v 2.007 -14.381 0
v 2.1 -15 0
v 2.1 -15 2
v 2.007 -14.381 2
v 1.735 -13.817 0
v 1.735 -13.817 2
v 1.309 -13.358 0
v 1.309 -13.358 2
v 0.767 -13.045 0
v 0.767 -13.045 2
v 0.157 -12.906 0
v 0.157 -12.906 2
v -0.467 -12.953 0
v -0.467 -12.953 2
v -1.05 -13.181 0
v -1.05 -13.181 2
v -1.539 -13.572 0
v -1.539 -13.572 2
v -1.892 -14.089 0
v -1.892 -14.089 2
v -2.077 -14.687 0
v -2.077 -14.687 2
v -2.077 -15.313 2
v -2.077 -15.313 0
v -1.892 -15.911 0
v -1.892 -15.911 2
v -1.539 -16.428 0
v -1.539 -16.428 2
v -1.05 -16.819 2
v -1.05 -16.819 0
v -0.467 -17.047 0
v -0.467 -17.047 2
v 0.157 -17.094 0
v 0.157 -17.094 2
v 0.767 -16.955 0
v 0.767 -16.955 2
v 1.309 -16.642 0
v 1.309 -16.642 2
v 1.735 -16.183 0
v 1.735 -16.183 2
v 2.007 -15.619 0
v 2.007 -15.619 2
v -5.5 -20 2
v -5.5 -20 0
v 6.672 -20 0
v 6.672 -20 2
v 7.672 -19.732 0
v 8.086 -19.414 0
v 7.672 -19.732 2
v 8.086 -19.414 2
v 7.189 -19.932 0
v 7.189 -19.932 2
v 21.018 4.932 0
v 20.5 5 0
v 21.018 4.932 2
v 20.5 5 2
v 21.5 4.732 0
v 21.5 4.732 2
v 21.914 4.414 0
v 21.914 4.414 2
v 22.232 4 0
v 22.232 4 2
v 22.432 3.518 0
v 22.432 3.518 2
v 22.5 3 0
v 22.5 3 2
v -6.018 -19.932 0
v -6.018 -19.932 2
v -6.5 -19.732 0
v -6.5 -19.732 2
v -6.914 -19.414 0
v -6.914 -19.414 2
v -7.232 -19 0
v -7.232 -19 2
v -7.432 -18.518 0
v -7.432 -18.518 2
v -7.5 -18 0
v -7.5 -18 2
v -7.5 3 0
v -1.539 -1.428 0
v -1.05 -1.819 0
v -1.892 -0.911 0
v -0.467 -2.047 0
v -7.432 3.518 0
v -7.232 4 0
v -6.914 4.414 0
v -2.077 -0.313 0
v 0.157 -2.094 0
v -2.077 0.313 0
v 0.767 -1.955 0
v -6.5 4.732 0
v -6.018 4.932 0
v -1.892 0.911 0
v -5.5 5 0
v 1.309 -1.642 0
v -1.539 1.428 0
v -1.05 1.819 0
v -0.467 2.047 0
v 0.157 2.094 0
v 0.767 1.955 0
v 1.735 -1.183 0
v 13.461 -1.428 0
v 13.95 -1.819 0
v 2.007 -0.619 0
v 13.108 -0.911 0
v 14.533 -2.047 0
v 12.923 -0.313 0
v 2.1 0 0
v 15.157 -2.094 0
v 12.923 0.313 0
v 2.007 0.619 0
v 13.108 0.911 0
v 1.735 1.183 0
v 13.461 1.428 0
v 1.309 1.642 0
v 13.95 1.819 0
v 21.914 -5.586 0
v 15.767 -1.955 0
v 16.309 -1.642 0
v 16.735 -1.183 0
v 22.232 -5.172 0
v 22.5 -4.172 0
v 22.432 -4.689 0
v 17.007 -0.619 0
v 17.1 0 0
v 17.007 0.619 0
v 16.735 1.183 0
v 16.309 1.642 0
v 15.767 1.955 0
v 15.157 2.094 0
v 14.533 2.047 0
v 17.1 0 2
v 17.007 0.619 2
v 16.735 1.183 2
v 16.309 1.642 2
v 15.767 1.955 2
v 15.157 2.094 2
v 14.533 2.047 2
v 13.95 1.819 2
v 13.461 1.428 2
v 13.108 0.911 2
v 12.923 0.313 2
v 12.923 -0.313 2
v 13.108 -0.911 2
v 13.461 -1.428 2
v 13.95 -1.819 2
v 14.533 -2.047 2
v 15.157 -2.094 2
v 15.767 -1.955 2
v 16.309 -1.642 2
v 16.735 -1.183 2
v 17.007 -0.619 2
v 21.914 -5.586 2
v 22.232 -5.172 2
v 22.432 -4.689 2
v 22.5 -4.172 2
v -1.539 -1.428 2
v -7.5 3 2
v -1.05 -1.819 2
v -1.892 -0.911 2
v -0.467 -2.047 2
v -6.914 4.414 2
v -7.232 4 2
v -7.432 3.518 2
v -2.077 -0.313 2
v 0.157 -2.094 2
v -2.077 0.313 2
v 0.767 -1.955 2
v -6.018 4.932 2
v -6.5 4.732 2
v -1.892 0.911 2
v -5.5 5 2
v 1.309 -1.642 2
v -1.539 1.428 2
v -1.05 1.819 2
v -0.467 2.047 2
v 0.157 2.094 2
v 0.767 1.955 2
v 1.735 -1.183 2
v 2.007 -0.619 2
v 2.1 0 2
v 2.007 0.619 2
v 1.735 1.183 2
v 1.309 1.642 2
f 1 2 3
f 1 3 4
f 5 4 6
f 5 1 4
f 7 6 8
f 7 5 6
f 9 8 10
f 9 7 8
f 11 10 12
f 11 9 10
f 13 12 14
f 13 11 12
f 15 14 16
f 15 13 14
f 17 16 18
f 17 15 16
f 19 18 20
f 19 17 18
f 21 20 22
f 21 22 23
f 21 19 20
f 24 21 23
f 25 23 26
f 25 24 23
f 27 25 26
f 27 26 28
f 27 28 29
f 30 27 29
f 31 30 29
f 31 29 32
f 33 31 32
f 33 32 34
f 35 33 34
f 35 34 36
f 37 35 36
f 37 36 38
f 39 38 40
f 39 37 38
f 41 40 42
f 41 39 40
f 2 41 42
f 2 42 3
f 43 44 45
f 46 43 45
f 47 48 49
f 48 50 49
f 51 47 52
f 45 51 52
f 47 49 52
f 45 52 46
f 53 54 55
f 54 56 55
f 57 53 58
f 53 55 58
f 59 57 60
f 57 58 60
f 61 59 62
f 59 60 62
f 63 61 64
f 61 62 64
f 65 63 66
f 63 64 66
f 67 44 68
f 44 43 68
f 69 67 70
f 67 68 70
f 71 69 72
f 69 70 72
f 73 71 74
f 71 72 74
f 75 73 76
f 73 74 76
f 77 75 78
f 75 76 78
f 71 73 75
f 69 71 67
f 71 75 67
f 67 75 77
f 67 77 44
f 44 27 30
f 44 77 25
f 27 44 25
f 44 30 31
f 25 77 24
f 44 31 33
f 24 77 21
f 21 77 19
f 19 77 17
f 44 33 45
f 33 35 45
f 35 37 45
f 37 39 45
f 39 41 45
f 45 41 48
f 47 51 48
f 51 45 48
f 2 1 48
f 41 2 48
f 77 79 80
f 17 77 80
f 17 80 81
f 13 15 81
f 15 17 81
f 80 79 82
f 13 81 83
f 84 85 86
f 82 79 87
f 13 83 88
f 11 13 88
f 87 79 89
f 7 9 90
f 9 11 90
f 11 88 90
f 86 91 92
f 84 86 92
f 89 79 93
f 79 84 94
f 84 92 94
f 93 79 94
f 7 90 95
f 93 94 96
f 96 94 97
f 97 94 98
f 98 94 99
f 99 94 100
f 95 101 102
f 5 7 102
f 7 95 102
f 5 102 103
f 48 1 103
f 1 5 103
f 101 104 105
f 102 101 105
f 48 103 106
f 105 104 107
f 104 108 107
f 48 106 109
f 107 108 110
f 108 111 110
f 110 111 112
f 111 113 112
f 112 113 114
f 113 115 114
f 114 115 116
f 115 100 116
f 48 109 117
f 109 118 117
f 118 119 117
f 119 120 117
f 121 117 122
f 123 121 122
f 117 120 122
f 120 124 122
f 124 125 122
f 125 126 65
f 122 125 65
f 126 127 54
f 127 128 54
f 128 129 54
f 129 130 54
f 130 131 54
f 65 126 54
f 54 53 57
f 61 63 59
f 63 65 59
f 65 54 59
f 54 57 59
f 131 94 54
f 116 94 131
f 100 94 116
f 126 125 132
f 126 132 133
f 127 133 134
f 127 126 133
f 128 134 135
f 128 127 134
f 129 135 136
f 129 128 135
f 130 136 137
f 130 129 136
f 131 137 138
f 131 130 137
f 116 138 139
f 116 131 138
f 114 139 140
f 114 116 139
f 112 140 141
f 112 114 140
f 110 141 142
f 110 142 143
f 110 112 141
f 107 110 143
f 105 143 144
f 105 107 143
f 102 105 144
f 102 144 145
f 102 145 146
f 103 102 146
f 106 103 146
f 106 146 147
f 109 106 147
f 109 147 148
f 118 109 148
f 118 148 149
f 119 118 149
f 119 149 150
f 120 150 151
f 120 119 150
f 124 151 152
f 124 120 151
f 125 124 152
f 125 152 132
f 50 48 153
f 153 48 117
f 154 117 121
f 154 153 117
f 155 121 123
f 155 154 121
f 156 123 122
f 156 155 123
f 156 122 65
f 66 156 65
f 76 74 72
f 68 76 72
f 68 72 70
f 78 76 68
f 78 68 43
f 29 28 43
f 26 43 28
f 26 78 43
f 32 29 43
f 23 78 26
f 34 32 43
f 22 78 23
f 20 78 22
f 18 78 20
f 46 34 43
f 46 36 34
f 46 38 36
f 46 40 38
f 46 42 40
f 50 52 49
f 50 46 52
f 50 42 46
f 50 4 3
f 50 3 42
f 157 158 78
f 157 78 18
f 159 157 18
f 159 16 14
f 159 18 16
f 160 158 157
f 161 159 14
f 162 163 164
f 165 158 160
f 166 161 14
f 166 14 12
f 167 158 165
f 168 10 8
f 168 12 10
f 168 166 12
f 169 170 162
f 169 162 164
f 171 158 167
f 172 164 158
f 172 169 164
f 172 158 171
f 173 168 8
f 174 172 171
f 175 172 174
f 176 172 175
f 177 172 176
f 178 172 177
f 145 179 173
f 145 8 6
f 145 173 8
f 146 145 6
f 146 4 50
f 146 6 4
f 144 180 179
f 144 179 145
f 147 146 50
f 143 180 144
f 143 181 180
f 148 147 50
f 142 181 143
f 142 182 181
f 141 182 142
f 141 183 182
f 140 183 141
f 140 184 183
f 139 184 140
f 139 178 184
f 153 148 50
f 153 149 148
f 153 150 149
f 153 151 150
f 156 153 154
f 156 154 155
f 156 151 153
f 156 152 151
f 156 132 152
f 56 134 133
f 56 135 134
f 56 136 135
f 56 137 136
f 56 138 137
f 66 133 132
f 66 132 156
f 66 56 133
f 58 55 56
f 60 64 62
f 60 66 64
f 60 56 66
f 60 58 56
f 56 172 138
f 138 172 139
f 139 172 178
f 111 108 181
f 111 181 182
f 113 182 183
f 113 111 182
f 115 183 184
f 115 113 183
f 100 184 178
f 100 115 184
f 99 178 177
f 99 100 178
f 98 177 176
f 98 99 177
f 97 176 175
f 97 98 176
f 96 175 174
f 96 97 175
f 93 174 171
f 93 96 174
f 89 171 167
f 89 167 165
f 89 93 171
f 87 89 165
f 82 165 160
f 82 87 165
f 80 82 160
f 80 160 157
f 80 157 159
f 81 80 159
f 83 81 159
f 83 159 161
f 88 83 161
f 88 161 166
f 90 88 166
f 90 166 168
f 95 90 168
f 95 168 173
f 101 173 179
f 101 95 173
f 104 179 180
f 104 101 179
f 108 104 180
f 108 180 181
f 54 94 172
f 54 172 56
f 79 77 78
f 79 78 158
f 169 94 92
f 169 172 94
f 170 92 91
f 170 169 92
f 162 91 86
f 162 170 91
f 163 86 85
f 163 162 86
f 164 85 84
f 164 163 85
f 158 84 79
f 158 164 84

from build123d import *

# Parameters (mm, degrees)
SKETCH_1_W      = 15
SKETCH_1_H      = 25
SKETCH_1_R      = 2.1
SKETCH_1_H_2    = 10
EXTRUDE_1_DEPTH = 2
FILLET_1_R      = 2


with BuildPart() as part:
    # ｽｹｯﾁ1 → ﾎﾞｽ - 押し出し1 (new body)
    # profile 1 of 3: a face of its own
    with BuildSketch(Plane.XY):
        with Locations((0, -7.5)):
            Rectangle(SKETCH_1_W, SKETCH_1_H)
        with Locations((0, -15)):
            Circle(SKETCH_1_R, mode=Mode.SUBTRACT)
        Circle(SKETCH_1_R, mode=Mode.SUBTRACT)
    # profile 2 of 3: a face of its own
    with BuildSketch(Plane.XY):
        Polygon((7.5, -20), (22.5, -5), (7.5, -5), align=None)
    # profile 3 of 3: a face of its own
    with BuildSketch(Plane.XY):
        with Locations((15, 0)):
            Rectangle(SKETCH_1_W, SKETCH_1_H_2)
        with Locations((15, 0)):
            Circle(SKETCH_1_R, mode=Mode.SUBTRACT)
    extrude(amount=EXTRUDE_1_DEPTH)

    # ﾌｨﾚｯﾄ1
    fillet_1_edges = [part.edges().sort_by_distance(p)[0] for p in [
        (7.5, -20, 1),
        (-7.5, -20, 1),
        (-7.5, 5, 1),
        (22.5, 5, 1),
        (22.5, -5, 1),
    ]]
    fillet(fillet_1_edges, radius=FILLET_1_R)


solid = part.part
